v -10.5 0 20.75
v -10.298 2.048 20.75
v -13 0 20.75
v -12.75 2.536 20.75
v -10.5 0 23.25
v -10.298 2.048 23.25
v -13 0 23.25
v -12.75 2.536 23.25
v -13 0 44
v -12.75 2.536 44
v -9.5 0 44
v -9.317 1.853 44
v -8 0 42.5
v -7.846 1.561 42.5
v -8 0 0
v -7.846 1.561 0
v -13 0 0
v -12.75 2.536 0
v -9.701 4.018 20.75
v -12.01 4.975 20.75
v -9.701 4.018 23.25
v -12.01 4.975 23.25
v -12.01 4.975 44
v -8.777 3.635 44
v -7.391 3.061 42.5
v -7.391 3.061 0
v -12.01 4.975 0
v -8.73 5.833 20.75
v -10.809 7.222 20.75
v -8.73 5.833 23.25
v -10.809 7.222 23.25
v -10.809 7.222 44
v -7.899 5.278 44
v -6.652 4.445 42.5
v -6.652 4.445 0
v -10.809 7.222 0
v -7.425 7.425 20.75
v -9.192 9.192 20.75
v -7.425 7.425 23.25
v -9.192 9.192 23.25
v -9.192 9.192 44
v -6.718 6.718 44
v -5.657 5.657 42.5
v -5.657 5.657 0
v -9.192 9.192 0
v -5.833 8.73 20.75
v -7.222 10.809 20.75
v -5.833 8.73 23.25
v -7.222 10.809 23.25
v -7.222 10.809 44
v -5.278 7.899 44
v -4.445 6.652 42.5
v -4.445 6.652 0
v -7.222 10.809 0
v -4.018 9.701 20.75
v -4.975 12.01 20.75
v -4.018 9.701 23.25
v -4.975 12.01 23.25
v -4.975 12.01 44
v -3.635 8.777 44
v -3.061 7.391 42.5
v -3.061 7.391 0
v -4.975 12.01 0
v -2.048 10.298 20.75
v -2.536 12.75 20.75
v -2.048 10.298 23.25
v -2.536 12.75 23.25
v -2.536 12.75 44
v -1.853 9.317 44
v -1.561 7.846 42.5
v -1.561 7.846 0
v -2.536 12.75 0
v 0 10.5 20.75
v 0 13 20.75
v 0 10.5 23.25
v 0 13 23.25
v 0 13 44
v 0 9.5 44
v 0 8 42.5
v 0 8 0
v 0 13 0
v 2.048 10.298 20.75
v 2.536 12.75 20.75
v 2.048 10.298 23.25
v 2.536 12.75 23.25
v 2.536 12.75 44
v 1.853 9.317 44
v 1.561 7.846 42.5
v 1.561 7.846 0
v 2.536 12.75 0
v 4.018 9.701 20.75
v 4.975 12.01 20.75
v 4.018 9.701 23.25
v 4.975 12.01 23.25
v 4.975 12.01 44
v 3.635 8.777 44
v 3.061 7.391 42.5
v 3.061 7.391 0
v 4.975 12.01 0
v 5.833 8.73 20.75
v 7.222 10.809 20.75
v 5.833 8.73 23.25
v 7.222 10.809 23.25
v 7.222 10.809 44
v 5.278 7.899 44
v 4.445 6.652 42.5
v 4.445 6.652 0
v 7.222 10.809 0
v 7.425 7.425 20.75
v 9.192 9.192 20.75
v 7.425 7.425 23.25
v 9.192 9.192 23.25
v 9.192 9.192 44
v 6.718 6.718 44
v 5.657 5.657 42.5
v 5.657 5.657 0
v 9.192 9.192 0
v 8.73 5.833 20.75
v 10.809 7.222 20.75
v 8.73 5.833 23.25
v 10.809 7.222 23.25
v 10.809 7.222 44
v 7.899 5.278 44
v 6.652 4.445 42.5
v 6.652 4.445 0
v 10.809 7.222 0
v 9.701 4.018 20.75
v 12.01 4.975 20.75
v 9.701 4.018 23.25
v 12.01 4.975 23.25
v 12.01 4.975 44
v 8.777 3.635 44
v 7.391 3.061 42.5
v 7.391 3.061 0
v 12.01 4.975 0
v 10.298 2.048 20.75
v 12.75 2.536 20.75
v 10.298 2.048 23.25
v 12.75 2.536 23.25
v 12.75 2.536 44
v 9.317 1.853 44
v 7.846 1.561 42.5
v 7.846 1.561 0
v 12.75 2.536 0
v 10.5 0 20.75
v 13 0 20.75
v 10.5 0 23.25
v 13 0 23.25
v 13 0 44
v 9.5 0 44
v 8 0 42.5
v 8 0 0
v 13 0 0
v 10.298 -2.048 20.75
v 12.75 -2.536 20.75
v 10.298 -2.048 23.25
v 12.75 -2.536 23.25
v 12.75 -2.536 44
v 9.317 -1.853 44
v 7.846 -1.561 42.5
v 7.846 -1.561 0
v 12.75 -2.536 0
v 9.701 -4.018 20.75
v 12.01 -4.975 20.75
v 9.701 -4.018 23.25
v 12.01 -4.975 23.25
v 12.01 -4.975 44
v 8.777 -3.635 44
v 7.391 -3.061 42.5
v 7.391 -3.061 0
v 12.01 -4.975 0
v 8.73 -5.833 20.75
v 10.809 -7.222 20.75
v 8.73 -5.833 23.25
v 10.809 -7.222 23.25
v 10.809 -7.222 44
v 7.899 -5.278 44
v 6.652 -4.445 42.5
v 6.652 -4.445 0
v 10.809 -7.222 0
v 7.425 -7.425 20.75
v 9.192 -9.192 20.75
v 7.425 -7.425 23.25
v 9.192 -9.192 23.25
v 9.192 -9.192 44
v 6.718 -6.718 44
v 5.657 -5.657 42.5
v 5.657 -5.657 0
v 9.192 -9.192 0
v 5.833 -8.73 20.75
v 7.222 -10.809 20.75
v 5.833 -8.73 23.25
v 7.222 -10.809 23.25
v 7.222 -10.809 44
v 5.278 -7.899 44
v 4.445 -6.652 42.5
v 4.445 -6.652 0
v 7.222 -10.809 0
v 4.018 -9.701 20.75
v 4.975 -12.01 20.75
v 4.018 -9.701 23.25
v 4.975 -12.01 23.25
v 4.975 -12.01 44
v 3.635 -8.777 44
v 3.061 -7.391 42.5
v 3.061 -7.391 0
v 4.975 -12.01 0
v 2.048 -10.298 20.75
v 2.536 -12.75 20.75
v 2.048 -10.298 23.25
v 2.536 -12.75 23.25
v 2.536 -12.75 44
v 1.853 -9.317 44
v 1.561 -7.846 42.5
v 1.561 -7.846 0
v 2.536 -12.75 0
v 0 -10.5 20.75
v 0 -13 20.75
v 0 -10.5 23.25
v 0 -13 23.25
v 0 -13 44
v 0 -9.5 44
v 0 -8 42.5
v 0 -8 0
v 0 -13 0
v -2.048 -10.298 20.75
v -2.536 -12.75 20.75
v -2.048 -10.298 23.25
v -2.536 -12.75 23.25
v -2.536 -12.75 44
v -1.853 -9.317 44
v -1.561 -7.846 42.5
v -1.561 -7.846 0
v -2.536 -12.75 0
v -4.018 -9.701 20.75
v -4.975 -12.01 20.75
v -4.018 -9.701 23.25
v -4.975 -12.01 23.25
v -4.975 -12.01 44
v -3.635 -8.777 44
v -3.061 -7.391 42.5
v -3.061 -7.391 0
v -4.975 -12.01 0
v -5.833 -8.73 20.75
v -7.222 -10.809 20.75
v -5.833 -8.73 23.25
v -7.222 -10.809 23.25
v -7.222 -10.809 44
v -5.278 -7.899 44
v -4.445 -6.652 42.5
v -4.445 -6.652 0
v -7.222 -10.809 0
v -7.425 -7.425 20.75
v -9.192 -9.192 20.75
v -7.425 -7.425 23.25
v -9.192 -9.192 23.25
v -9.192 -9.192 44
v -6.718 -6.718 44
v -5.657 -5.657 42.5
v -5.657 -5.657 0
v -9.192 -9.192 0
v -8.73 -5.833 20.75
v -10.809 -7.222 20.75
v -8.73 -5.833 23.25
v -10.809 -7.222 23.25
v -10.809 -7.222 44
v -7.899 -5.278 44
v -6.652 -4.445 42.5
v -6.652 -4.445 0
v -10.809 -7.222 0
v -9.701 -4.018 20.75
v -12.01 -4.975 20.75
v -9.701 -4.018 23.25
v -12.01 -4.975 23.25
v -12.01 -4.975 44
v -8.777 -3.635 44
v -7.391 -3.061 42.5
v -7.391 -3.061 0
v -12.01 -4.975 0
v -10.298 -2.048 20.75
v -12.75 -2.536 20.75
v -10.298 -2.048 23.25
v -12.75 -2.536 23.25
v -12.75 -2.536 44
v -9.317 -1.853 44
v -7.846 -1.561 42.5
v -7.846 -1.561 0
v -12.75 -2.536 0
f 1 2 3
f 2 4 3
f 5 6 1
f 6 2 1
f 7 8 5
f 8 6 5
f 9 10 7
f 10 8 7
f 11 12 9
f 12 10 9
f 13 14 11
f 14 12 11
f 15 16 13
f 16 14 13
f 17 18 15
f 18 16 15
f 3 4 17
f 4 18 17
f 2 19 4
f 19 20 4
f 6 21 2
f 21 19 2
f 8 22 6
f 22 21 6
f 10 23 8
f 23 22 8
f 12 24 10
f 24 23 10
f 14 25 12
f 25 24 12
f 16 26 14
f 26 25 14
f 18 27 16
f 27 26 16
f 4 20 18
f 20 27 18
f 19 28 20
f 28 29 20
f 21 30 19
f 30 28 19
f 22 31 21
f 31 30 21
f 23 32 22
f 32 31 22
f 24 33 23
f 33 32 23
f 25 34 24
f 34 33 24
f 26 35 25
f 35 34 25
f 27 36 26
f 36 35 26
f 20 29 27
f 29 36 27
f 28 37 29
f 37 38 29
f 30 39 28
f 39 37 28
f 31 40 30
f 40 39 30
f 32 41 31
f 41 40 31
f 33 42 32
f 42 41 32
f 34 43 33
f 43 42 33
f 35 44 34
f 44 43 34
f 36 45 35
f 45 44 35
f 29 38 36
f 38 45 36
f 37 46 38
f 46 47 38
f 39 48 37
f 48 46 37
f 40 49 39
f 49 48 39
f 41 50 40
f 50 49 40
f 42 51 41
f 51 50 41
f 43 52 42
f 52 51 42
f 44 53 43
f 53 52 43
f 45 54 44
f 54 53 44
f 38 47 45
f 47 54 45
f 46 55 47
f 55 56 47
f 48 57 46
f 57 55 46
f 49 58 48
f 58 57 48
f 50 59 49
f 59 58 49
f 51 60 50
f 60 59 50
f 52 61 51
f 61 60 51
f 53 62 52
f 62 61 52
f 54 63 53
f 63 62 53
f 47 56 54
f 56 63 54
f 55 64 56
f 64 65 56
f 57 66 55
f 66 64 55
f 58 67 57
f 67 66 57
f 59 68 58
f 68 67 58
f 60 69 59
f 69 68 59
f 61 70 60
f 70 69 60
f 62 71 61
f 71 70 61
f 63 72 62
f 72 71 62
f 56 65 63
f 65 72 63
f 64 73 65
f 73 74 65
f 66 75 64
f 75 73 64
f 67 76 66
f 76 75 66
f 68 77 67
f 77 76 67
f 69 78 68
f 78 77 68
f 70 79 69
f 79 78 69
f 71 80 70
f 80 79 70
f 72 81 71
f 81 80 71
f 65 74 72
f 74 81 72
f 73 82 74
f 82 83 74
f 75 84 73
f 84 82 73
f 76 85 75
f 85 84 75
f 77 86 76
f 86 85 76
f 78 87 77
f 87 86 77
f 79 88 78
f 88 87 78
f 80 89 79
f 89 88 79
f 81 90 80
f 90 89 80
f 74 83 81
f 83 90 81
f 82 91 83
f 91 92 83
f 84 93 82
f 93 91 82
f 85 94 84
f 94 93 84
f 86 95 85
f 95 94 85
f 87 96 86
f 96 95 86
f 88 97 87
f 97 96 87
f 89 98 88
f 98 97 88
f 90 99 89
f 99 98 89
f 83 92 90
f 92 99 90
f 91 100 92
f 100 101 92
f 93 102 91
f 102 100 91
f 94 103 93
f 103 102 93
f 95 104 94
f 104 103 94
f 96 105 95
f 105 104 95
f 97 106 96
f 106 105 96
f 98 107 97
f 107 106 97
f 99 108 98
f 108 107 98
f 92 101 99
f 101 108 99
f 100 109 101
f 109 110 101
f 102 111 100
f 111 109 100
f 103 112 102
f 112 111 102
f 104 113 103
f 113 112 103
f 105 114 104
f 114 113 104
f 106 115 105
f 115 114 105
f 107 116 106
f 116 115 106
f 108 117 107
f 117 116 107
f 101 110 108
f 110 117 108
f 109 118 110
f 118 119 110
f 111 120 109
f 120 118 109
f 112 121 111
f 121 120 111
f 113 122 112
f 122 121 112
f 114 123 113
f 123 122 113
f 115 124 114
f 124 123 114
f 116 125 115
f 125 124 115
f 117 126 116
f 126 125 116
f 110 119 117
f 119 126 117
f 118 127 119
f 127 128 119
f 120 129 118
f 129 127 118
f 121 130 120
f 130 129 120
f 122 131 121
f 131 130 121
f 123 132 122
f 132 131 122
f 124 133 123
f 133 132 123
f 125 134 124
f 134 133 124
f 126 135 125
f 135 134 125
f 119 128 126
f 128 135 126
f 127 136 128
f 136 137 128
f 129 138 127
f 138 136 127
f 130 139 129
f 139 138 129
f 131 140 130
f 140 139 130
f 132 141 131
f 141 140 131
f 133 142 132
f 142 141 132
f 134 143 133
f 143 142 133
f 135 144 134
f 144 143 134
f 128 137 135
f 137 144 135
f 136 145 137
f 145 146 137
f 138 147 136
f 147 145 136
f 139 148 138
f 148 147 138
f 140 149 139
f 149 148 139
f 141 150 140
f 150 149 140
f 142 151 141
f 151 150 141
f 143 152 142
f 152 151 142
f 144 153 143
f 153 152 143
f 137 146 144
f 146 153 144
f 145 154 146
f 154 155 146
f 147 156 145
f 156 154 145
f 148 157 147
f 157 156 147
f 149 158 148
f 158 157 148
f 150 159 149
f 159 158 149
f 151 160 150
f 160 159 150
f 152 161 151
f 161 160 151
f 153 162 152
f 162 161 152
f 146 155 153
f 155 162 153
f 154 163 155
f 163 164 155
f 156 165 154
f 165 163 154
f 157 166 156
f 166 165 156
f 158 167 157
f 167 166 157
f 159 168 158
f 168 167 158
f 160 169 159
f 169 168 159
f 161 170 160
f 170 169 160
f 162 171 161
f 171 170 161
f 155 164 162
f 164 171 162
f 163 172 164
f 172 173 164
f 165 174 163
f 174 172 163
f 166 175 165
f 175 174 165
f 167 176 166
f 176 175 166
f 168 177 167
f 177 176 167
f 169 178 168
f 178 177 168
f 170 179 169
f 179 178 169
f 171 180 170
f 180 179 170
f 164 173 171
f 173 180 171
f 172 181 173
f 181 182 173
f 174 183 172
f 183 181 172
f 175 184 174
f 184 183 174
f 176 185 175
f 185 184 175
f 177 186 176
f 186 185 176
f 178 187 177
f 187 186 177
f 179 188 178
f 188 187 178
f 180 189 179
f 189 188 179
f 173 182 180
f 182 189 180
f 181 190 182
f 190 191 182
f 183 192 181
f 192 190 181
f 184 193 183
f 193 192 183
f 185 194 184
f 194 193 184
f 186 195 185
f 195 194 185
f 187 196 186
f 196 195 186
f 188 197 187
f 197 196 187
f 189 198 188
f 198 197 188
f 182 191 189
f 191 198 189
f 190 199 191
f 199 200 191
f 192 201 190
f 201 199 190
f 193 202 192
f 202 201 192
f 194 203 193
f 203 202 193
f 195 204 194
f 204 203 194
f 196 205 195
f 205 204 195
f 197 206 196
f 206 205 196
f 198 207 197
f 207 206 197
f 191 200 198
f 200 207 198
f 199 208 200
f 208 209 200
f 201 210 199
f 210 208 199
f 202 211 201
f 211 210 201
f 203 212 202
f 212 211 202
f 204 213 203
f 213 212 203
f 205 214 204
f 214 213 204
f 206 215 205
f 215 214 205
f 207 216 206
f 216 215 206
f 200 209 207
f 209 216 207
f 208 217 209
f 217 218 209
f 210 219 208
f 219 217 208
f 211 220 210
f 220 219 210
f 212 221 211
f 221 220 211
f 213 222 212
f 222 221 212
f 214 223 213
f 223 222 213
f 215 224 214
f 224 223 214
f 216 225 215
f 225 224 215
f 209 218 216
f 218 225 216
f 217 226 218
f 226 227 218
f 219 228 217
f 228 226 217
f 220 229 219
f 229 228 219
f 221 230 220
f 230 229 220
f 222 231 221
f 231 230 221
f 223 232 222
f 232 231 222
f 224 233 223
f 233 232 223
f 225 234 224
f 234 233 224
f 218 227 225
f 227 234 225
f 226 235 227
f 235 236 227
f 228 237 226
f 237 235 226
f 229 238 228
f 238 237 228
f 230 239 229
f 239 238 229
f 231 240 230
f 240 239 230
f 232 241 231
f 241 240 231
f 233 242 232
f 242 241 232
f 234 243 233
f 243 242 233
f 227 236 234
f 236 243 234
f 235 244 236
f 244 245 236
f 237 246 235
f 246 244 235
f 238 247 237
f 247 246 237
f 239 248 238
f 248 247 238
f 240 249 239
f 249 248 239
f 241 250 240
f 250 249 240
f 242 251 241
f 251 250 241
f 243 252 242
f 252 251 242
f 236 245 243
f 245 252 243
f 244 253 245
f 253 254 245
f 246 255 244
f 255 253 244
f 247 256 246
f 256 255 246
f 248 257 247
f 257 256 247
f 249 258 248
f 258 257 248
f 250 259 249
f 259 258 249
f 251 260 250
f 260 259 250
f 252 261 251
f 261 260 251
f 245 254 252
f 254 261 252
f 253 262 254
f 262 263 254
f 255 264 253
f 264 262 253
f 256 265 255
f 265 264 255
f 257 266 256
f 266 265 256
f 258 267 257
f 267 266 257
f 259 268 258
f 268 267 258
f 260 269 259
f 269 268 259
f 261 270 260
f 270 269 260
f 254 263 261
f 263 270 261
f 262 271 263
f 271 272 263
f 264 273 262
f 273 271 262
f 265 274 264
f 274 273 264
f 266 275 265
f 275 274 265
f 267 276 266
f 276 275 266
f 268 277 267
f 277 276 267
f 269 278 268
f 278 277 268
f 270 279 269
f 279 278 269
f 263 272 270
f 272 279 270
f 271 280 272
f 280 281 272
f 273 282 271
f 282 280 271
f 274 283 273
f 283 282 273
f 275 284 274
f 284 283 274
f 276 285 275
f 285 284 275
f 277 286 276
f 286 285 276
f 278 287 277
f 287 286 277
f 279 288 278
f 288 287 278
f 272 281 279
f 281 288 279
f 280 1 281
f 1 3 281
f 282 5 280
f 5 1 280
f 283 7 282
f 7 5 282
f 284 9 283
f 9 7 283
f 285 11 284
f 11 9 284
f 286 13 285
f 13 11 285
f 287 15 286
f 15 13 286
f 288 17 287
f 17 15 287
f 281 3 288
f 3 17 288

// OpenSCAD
$fn = 32;

// ----------------------------------------------------------------------
// Grooved revolve: thread_relief, bore R8
// ----------------------------------------------------------------------

// --- parameters (mm) ---
bore_r = 8;               // bore radius
outer_r = 13;             // outer radius of the body
total_h = 44;             // overall height, Z
wall = 5;                 // radial wall thickness
groove_w = 2.5;           // groove width
groove_d = 2.5;           // groove depth
grooves = 1;              // number of outer grooves
relief = 1.5;             // thread relief leg at the bore mouth
relief_angle = 45;        // thread relief chamfer angle, degrees

bbox_x = 2 * outer_r;  // full diameter
bore_d = 2 * bore_r;  // bore diameter
body_d = 2 * outer_r;  // body diameter
revolve_angle = 360;  // full turn around the Z axis

profile = [[8, 0], [13, 0], [13, 20.75], [10.5, 20.75], [10.5, 23.25], [13, 23.25], [13, 44], [9.5, 44], [8, 42.5]];  // primary outline, 9 points, counter clockwise

// --- the one profile operation ---
rotate_extrude(angle = revolve_angle) polygon(points = profile);
